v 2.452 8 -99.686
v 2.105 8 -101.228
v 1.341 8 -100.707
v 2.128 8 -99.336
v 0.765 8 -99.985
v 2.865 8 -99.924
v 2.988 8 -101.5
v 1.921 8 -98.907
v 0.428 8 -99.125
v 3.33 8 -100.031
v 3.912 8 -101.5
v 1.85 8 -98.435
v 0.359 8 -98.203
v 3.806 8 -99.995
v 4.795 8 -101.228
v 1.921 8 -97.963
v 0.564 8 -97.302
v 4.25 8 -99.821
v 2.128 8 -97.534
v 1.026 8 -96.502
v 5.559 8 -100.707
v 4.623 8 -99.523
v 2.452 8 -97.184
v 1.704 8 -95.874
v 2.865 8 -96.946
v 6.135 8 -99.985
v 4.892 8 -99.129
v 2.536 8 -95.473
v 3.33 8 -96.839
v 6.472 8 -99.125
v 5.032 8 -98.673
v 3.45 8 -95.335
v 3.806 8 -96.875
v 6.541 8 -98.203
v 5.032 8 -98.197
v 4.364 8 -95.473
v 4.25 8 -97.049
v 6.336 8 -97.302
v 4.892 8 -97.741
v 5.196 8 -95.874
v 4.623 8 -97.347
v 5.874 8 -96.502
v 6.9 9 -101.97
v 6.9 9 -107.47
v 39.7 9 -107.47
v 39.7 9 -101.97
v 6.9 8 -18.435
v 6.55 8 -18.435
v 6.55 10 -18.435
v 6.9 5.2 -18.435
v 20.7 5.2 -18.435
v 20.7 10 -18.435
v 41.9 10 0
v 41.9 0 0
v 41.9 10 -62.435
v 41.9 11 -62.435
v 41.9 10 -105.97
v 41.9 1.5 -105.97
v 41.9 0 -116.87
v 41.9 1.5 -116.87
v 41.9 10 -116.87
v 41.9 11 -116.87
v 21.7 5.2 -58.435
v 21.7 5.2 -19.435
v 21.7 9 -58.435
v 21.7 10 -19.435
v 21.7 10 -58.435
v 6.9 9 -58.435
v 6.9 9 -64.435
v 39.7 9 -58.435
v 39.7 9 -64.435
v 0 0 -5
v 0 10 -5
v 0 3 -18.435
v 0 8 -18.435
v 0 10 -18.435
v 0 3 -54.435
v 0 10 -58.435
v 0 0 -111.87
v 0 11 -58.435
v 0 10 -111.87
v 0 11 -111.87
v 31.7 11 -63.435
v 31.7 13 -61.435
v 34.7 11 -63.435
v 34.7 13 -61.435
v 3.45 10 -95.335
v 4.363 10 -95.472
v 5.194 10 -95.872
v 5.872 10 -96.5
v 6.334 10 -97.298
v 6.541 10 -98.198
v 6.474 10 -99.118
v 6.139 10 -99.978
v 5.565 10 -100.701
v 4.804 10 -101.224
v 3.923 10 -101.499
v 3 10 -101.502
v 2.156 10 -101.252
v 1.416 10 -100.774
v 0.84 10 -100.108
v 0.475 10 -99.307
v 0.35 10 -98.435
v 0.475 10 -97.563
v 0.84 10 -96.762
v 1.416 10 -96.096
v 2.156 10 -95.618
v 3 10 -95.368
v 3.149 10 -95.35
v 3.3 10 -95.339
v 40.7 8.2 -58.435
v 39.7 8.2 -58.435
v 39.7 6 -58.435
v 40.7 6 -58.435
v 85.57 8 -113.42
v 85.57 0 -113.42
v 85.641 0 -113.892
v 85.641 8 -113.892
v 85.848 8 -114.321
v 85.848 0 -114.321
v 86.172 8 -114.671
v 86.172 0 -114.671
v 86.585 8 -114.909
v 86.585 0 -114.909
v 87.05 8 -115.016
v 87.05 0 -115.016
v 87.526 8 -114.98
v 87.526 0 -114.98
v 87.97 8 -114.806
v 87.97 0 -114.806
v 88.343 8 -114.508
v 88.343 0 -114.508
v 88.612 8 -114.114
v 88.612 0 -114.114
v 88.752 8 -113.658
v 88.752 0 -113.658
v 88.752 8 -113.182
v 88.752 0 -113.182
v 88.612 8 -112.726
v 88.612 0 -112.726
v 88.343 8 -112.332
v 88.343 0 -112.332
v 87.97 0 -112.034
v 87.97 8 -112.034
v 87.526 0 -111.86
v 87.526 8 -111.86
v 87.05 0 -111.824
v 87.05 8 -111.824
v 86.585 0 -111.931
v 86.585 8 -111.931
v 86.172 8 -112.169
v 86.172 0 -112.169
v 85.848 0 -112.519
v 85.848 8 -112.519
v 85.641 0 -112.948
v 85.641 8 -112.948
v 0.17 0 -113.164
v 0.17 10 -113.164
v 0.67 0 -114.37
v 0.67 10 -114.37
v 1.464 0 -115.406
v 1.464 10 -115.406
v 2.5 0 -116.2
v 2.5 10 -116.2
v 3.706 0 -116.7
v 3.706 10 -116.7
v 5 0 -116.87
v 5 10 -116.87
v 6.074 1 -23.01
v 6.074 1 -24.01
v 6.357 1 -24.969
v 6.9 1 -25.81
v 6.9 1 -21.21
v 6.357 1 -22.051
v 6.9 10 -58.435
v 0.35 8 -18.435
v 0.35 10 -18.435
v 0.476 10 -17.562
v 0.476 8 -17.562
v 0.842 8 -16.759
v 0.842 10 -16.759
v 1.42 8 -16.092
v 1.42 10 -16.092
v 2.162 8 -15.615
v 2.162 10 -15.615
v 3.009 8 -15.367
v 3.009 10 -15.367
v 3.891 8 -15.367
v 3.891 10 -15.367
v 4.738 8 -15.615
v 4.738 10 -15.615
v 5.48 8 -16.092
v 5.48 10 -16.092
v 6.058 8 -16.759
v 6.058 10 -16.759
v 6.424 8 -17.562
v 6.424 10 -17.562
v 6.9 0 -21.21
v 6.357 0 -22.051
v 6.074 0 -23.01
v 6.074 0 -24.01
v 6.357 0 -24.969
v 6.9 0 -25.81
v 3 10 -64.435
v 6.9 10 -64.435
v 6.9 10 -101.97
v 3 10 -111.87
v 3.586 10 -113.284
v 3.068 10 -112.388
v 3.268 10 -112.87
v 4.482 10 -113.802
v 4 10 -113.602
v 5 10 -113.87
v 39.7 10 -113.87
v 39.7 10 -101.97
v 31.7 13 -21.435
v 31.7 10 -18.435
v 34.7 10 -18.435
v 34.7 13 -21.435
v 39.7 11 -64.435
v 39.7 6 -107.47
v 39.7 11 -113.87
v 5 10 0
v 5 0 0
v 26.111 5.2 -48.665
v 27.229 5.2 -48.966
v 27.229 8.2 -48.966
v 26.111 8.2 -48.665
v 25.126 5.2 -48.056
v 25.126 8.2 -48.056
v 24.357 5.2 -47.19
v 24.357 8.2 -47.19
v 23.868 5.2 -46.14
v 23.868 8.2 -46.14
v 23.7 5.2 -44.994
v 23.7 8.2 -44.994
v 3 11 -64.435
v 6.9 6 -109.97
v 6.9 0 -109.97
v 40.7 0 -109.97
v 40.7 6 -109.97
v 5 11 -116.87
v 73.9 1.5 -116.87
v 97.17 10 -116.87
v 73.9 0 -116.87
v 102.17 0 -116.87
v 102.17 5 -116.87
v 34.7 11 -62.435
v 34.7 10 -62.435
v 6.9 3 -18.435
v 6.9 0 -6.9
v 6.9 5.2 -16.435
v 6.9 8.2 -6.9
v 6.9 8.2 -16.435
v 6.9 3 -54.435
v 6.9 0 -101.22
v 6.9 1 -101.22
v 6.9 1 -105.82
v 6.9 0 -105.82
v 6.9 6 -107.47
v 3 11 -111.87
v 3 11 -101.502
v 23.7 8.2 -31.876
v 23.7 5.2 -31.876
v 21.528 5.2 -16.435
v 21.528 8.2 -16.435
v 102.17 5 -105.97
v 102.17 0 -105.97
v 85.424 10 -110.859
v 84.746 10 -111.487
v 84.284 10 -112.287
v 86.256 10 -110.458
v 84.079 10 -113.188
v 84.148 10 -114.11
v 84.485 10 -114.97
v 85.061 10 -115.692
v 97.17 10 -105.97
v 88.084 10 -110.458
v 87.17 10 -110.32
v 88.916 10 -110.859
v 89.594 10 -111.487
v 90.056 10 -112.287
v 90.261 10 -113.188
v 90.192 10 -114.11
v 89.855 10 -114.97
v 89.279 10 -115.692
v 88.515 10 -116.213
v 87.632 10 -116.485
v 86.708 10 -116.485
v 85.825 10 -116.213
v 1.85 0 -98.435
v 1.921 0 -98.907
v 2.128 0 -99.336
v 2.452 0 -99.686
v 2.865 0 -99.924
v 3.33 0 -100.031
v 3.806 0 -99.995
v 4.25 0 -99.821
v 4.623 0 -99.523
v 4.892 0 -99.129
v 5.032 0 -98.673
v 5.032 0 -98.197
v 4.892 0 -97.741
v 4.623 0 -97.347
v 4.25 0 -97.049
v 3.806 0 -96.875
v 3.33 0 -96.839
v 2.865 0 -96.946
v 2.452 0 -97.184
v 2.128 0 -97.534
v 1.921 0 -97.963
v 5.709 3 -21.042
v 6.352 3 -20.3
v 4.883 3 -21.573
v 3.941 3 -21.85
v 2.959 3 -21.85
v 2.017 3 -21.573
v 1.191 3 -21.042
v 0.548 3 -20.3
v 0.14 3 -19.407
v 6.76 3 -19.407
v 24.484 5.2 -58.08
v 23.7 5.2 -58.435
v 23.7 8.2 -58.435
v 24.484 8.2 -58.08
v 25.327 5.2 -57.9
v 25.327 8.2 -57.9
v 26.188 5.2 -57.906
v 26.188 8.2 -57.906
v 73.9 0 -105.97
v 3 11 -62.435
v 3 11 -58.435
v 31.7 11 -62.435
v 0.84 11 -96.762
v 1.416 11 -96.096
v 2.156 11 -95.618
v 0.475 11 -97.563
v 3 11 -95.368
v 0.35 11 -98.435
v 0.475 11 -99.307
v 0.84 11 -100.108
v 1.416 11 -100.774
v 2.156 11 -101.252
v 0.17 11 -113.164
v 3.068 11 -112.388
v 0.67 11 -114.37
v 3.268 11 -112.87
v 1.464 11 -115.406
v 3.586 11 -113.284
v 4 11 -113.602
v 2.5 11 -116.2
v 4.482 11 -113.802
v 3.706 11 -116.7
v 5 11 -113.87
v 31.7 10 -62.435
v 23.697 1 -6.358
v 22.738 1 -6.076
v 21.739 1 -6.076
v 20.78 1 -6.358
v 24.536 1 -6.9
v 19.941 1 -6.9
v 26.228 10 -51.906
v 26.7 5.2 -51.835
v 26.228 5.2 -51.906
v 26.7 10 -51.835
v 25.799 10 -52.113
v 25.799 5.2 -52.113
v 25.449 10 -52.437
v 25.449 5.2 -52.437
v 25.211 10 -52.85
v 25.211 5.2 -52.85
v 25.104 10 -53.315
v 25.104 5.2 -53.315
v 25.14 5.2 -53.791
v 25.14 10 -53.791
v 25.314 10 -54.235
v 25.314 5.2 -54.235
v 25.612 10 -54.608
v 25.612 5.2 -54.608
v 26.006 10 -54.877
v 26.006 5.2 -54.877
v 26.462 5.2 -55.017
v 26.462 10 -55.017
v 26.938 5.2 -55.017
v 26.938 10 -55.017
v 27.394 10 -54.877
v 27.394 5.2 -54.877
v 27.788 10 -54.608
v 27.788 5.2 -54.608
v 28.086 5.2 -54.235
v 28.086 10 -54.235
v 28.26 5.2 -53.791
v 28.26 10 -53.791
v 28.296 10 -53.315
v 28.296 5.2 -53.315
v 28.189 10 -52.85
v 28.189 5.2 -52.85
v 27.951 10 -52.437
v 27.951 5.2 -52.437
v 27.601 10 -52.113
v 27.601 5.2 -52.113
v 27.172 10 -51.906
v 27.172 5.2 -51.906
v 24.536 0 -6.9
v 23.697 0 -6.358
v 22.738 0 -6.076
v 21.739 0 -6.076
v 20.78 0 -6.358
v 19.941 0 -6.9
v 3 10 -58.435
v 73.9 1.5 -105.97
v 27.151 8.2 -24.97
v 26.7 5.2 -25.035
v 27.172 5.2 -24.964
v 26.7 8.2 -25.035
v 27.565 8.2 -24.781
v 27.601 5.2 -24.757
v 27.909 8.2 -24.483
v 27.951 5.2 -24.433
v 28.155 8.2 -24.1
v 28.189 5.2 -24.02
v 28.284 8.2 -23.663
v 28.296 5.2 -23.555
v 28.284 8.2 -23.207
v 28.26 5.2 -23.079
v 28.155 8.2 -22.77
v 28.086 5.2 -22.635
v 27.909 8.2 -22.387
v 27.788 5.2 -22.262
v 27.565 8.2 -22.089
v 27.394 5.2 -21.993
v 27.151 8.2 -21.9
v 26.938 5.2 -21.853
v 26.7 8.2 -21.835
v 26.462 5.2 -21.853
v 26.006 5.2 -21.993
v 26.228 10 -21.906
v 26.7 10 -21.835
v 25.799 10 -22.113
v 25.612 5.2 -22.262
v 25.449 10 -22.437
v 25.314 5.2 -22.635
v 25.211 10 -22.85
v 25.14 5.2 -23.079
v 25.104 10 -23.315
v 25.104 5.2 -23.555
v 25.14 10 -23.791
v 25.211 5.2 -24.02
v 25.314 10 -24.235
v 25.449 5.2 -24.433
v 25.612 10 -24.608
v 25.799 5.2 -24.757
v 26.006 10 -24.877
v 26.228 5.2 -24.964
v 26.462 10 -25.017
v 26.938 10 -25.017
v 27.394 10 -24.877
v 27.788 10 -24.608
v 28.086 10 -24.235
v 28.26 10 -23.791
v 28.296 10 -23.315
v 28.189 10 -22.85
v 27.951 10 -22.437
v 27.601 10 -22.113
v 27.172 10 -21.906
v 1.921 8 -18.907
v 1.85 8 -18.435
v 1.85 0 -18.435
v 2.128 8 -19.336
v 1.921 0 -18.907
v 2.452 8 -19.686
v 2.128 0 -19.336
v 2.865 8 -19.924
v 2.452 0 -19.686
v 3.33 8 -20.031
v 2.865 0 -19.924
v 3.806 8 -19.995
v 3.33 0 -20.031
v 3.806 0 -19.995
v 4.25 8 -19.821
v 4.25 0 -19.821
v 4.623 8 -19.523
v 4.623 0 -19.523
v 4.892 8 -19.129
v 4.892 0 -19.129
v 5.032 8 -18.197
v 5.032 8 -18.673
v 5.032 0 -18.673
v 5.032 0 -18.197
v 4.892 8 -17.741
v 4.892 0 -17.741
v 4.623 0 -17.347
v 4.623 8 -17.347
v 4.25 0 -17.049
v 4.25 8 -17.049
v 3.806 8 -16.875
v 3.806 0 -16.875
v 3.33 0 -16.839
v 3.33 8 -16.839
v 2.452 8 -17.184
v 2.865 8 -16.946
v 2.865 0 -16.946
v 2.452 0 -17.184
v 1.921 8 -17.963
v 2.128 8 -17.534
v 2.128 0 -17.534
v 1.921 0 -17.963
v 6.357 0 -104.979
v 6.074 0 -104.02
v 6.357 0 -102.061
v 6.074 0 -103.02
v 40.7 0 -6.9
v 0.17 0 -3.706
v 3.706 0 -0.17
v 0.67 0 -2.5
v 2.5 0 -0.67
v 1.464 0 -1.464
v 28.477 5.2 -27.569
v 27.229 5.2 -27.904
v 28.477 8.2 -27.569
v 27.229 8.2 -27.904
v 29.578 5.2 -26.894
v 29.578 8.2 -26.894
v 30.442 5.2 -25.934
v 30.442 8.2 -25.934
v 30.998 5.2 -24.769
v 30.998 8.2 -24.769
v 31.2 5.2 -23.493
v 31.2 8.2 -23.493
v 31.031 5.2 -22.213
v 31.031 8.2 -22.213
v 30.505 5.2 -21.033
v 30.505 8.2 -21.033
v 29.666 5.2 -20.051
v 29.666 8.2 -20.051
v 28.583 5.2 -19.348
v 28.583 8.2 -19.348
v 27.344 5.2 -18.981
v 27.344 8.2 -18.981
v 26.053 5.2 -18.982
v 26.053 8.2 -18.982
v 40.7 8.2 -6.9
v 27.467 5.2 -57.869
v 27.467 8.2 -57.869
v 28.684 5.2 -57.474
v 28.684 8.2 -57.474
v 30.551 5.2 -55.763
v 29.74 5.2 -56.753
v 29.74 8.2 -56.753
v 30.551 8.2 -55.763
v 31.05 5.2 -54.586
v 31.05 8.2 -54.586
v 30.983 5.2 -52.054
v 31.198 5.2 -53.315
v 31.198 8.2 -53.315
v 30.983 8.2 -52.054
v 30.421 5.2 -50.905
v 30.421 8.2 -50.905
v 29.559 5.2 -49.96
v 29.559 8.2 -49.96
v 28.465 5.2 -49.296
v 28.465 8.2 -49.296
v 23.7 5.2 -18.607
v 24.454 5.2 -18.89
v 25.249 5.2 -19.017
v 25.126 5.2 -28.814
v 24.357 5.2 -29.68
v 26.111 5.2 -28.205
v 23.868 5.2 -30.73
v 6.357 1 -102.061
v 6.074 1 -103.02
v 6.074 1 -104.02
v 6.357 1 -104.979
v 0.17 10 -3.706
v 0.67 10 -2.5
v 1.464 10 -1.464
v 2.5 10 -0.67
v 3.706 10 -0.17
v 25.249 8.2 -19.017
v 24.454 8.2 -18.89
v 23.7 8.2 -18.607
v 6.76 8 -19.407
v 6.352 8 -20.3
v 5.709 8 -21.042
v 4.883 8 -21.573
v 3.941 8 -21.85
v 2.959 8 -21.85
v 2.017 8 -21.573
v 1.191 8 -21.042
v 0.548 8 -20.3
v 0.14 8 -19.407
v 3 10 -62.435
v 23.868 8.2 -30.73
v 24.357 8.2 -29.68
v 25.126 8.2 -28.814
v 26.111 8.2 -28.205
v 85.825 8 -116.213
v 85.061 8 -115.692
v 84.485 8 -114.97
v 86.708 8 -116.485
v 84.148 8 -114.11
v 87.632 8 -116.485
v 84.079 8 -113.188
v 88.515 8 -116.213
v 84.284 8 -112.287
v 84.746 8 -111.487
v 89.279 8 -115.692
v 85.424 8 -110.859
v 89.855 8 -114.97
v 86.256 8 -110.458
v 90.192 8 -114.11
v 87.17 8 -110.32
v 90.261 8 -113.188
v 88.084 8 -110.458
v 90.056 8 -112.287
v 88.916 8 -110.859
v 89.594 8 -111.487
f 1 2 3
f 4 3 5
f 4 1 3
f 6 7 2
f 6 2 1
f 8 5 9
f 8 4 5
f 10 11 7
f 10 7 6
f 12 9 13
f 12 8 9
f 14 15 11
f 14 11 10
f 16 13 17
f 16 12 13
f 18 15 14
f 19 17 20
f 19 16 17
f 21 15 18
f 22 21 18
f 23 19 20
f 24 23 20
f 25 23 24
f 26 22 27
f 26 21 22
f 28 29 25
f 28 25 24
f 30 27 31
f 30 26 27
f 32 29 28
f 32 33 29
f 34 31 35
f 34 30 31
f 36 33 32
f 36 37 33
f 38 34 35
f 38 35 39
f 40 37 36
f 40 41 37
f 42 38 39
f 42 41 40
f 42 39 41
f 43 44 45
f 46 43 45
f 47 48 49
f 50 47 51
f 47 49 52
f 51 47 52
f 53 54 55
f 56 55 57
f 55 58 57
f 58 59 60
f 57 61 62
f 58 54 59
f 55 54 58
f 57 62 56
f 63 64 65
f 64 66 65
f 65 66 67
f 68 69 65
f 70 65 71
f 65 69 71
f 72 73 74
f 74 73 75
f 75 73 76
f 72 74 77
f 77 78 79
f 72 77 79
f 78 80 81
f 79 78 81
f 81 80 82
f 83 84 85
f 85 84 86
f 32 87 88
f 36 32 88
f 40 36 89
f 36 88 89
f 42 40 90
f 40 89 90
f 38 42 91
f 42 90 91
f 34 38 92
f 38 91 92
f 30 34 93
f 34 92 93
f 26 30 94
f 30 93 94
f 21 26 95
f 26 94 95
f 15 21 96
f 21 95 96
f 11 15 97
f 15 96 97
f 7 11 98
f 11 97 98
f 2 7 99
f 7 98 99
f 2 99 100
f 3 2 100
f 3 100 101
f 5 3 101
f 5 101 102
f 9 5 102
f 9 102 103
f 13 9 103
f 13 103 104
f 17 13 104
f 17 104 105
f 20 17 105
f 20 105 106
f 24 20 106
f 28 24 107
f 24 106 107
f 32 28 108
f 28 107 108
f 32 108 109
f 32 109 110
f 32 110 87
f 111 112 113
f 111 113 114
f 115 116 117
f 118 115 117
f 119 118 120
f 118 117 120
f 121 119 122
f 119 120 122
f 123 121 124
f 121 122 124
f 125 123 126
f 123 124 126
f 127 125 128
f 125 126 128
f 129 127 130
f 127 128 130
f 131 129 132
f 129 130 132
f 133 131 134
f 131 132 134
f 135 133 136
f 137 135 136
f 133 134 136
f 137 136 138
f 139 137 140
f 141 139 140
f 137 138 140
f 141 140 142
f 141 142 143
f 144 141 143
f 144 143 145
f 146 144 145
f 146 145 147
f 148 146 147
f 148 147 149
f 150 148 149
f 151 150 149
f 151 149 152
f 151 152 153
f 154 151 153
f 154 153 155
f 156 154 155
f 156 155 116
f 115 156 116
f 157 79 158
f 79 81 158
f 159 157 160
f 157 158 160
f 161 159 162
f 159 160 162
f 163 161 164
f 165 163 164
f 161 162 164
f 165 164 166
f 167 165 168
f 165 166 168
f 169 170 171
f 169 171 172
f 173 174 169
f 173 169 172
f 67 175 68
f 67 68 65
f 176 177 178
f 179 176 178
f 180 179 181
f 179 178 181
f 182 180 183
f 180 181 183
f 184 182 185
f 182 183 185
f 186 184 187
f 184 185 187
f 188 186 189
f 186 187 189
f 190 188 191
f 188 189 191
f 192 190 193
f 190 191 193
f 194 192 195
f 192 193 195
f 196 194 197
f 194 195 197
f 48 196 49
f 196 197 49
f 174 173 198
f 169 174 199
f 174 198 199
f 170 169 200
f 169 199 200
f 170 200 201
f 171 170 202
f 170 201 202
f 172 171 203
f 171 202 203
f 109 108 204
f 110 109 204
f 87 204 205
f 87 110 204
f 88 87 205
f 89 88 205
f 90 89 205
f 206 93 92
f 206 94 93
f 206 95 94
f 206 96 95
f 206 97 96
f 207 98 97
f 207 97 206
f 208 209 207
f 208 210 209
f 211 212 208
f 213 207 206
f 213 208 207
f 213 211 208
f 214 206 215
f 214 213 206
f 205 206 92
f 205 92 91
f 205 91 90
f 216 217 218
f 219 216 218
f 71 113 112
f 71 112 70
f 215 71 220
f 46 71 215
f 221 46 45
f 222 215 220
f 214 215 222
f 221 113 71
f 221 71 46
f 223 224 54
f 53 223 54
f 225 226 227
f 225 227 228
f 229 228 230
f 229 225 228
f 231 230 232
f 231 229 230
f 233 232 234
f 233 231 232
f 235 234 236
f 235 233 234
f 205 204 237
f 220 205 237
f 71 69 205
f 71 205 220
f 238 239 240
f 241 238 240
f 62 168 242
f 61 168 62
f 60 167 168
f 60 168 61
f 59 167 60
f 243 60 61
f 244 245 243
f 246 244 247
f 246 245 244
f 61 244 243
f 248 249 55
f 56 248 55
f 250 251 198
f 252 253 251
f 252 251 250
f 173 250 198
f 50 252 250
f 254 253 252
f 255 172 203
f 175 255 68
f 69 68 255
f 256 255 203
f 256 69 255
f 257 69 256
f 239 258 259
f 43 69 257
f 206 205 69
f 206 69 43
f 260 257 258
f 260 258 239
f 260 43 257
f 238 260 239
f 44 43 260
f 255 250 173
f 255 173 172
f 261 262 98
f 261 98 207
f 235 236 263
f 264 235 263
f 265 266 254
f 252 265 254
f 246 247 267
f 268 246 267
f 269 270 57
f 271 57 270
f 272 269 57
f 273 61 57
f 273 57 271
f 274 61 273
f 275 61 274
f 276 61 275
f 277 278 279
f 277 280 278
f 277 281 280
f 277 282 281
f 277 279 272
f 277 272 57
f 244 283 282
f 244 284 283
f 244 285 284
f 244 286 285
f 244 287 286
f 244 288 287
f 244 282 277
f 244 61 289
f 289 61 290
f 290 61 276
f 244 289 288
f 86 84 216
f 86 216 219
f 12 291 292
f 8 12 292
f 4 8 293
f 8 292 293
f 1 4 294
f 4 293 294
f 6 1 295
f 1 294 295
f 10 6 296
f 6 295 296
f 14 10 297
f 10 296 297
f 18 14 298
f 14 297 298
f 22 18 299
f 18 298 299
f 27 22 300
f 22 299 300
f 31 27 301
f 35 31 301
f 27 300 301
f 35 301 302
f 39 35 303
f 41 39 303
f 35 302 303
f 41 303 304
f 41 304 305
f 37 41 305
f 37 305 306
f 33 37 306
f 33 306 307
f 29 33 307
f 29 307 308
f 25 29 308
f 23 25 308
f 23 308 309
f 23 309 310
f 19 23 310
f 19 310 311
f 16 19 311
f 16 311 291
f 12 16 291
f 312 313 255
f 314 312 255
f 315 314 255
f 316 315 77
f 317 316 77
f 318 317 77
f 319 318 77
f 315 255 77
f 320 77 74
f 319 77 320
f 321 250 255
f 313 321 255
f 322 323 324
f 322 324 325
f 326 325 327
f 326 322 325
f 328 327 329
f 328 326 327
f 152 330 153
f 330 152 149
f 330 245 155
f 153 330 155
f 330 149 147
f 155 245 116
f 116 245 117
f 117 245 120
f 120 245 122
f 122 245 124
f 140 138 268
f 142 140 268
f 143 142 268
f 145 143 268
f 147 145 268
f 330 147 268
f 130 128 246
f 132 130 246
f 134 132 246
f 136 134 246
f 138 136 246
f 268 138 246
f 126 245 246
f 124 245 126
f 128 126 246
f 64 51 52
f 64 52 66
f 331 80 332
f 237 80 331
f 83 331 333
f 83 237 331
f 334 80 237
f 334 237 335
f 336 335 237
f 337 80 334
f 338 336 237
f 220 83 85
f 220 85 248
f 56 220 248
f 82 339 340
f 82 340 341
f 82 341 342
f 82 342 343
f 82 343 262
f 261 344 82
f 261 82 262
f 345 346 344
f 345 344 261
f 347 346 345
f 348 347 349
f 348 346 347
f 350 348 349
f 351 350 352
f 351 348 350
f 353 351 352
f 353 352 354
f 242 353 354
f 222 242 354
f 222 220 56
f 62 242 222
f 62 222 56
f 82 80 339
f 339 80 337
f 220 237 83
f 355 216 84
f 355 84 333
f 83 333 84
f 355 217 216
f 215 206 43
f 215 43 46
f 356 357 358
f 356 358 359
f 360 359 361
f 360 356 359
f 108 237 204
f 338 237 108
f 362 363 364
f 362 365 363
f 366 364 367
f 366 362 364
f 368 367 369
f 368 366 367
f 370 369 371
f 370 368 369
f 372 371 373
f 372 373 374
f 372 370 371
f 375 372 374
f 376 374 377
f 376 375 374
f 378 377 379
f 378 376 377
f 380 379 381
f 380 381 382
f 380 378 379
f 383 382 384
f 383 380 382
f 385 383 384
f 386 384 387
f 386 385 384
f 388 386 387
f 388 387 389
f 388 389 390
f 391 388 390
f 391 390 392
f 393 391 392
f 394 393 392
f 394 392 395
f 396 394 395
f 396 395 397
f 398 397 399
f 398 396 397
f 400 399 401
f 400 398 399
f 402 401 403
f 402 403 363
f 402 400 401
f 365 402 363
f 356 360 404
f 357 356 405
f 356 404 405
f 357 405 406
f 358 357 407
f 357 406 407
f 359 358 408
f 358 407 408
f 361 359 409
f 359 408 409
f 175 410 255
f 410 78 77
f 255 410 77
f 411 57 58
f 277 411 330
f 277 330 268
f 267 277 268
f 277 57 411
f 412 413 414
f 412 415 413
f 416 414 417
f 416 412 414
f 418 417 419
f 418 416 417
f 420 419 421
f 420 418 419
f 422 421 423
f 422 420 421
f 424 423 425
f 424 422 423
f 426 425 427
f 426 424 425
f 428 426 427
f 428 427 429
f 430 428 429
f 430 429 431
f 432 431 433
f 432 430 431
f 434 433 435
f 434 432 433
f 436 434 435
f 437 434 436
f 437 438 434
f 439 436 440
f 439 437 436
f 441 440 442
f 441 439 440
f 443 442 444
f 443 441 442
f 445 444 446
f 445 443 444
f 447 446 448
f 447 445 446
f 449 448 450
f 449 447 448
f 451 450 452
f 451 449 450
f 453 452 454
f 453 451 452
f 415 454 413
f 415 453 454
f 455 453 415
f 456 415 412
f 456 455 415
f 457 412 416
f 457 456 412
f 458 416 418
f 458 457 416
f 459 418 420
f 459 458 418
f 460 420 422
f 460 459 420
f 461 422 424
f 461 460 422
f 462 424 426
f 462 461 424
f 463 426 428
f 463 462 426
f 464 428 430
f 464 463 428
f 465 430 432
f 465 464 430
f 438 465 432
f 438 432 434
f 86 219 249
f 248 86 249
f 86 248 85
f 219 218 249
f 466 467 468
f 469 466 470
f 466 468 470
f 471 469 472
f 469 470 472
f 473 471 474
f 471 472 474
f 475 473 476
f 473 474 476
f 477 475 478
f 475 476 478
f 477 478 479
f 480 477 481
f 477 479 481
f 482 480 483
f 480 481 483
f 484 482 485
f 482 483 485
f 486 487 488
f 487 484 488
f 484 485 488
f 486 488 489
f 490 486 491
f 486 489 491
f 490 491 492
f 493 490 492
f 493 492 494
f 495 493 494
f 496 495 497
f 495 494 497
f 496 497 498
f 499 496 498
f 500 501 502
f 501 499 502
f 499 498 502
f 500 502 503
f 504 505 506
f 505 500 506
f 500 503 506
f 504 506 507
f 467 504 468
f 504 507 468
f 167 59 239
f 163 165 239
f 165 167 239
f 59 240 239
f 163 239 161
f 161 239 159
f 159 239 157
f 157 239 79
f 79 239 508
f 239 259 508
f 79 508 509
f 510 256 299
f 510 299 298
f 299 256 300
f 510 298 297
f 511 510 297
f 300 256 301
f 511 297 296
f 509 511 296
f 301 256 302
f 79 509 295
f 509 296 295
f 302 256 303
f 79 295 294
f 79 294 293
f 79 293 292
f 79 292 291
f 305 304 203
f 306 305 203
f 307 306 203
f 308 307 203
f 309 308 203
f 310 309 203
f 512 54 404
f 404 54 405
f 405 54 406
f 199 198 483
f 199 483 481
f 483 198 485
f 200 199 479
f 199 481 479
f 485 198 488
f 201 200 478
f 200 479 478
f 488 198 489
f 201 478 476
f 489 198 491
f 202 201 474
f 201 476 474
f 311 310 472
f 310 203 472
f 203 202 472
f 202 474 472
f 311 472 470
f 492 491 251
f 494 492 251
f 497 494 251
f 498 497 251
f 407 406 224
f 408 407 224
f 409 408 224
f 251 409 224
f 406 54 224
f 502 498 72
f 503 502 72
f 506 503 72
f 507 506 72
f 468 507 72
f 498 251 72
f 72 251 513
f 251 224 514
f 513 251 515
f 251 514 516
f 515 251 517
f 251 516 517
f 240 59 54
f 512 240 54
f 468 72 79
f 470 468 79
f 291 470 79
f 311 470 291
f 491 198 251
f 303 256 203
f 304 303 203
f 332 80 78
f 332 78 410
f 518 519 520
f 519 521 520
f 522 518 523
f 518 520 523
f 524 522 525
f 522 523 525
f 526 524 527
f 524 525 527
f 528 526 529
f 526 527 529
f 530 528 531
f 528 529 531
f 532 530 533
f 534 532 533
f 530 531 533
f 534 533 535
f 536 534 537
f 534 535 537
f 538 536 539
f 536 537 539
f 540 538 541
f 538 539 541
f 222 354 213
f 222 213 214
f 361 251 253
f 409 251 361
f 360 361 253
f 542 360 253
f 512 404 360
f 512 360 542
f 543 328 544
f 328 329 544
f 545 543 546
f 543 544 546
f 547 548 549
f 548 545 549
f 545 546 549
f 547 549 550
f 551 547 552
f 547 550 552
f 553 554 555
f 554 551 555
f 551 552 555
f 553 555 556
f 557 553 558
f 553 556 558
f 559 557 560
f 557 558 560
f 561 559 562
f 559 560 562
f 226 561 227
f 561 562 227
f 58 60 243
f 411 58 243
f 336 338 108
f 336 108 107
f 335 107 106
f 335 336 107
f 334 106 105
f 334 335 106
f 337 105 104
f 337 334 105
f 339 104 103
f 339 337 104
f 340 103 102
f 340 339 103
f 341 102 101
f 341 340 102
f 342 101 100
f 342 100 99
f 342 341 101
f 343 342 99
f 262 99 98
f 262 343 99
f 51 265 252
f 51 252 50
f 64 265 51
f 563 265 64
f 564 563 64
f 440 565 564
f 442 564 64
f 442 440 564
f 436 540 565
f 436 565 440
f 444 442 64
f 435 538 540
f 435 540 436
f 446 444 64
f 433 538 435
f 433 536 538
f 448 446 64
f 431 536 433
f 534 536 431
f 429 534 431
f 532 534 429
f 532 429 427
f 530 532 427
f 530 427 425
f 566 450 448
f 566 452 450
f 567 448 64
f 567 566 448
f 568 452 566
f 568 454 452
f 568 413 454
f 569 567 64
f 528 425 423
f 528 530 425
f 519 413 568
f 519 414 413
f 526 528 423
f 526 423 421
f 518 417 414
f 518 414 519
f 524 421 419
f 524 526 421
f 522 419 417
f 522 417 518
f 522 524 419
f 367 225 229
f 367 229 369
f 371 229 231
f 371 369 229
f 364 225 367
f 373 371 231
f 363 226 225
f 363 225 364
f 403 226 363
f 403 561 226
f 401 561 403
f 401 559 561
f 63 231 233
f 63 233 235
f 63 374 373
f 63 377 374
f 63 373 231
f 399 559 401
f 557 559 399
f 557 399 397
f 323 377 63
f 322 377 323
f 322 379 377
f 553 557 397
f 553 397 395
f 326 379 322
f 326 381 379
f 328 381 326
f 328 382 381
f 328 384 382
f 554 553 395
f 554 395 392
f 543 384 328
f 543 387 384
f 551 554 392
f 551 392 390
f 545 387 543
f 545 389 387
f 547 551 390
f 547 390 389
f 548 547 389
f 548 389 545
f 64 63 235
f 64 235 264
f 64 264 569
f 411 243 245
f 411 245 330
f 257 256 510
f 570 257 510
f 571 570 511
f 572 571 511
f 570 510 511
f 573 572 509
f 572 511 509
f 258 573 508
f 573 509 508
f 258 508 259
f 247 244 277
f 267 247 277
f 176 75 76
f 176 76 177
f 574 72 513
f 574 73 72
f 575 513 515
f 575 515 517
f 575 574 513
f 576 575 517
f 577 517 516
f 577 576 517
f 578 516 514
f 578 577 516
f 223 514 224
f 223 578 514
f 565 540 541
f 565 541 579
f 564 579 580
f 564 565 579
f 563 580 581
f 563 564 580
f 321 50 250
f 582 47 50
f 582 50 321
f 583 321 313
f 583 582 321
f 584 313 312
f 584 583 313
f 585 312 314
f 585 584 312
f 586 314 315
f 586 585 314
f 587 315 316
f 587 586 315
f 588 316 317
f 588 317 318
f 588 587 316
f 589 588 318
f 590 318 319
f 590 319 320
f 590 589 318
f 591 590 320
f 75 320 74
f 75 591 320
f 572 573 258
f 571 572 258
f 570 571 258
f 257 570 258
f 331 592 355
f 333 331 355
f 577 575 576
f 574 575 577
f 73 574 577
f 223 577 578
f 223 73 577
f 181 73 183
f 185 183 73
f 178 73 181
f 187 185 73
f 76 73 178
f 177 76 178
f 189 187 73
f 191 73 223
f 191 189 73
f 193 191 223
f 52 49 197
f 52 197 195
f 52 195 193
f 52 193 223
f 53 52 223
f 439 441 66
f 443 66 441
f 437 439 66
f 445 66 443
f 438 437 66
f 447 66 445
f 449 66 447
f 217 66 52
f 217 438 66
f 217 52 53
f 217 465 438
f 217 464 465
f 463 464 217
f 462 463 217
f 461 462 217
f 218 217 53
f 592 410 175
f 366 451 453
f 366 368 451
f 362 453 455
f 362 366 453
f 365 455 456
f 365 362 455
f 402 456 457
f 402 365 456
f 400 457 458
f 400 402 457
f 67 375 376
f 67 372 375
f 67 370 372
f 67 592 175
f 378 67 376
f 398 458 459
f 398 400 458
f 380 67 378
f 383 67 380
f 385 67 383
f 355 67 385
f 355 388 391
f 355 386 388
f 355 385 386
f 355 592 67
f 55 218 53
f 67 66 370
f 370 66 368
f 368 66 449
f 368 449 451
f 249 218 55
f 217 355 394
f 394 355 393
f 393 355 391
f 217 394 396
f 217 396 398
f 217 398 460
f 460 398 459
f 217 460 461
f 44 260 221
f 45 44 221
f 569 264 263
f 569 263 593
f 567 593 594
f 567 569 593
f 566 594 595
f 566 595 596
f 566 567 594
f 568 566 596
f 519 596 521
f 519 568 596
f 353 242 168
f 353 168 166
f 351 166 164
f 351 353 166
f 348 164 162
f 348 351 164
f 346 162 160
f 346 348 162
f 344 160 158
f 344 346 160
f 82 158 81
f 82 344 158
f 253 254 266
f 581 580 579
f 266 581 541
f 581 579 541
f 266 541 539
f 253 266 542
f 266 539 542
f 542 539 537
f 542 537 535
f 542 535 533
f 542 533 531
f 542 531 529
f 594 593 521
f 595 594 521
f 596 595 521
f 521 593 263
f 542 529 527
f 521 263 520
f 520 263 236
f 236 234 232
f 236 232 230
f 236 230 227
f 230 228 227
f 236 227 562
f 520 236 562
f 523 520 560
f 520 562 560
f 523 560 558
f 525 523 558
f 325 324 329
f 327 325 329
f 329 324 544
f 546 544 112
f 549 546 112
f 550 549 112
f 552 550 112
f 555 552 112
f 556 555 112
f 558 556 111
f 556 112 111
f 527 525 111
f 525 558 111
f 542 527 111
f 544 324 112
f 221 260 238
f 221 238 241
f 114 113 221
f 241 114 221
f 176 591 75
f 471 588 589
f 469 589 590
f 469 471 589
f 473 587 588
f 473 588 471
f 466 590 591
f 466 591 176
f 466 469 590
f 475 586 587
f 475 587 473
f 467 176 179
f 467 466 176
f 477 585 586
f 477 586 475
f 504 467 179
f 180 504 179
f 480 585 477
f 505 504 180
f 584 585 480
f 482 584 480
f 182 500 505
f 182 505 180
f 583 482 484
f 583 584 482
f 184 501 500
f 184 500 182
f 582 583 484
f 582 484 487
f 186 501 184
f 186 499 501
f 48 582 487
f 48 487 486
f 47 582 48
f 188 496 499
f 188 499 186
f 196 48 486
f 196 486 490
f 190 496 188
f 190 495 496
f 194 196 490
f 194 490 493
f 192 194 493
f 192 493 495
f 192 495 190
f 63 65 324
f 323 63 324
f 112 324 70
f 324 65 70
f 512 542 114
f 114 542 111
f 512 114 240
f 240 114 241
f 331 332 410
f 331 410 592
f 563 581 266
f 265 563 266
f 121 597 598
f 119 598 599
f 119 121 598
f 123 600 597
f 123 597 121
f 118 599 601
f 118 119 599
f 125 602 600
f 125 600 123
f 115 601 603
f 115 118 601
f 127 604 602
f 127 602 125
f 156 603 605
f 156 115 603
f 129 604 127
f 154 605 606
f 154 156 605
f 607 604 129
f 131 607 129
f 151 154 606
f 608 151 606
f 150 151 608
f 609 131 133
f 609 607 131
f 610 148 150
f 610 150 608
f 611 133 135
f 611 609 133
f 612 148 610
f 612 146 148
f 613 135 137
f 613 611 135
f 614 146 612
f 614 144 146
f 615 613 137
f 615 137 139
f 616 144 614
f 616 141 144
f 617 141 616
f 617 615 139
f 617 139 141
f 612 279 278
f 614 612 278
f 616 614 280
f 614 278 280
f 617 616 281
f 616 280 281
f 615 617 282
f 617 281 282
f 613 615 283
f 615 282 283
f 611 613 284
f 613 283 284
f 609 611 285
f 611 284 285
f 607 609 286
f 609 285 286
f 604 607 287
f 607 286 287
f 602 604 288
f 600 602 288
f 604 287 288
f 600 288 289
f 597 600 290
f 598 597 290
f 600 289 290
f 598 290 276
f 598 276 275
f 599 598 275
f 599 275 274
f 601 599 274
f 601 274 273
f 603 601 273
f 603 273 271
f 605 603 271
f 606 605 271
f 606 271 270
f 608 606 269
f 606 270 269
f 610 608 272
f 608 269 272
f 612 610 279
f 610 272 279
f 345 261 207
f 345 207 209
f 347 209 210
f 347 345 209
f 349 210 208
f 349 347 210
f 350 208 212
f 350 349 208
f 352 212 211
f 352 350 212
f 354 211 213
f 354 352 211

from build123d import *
from build123d.topology import SkipClean

# Parameters (mm, degrees)
SKETCH_1_W              = 337.35
SKETCH_1_H              = 116.87
SKETCH_1_W_2            = 324.05
SKETCH_1_H_2            = 103.07
EXTRUDE_1_DEPTH         = 10
FILLET_1_R              = 5
HOLE_WIZARD_3_2_3_2_1_D = 3.2
SKETCH_5_W              = 32
SKETCH_5_H              = 1.5
CUT_EXTRUDE_1_DEPTH     = 355.962566195
EXTRUDE_2_REACH         = 356.963
SKETCH_6_W              = 3
SKETCH_6_H              = 10
SKETCH_7_W              = 257.05
SKETCH_7_H              = 10
EXTRUDE_3_DEPTH         = 4
SKETCH_8_W              = 257.05
SKETCH_8_H              = 4
EXTRUDE_4_DEPTH         = 3
SKETCH_11_W             = 99.07
SKETCH_11_H             = 13
EXTRUDE_5_DEPTH         = 2
SKETCH_13_W             = 42
SKETCH_13_H             = 6.5
CUT_EXTRUDE_2_DEPTH     = 354.743782136
SKETCH_14_W             = 121.5
SKETCH_14_H             = 3.5
CUT_EXTRUDE_3_DEPTH     = 355.962566195
SKETCH_16_W             = 32
SKETCH_16_H             = 8.5
EXTRUDE_7_DEPTH         = 4
SKETCH_17_W             = 103.07
SKETCH_17_H             = 3
CUT_EXTRUDE_4_DEPTH     = 0.1
EXTRUDE_8_DEPTH         = 2
SKETCH_19_W             = 70.55
SKETCH_19_H             = 2
SKETCH_19_W_2           = 95
EXTRUDE_9_DEPTH         = 3
SKETCH_20_R             = 3.5
CUT_EXTRUDE_5_DEPTH     = 4
SKETCH_21_R             = 3.1
CUT_EXTRUDE_6_DEPTH     = 2
SKETCH_24_W             = 103.07
SKETCH_24_H             = 3
CUT_EXTRUDE_8_DEPTH     = 358.160495296
SKETCH_26_W             = 675.8738904
SKETCH_26_H             = 351.874844901
CUT_EXTRUDE_9_DEPTH     = 358.160495296
SKETCH_27_W             = 1.8
SKETCH_27_H             = 103.07
CUT_EXTRUDE_10_DEPTH    = 156.554832133
CUT_EXTRUDE_11_DEPTH    = 7
SKETCH_30_W             = 6.9
SKETCH_30_H             = 3.45
CUT_EXTRUDE_12_DEPTH    = 2
SKETCH_31_W             = 19
SKETCH_31_H             = 51.535
EXTRUDE_10_DEPTH        = 1.8
CHAMFER_2_SIZE          = 1
SKETCH_32_W             = 14.8
SKETCH_32_H             = 11.535
EXTRUDE_11_DEPTH        = 1.8
CHAMFER_1_SIZE          = 5
CHAMFER_3_SIZE          = 1
EXTRUDE_12_DEPTH        = 6.9
EXTRUDE_13_DEPTH        = 3
EXTRUDE_START           = 1
EXTRUDE_14_DEPTH        = 1
SKETCH_36_W             = 1
SKETCH_36_H             = 51.535
EXTRUDE_15_DEPTH        = 4
SKETCH_37_W             = 33.661543988
SKETCH_37_H             = 2.5
EXTRUDE_16_DEPTH        = 4
SKETCH_38_W             = 36.7
SKETCH_38_H             = 6
EXTRUDE_18_DEPTH        = 1
SKETCH_39_W             = 32.8
SKETCH_39_H             = 5.5
EXTRUDE_19_DEPTH        = 1
SKETCH_40_R             = 1.6
CUT_EXTRUDE_13_DEPTH    = 156.554832133
SKETCH_41_R             = 4.5
SKETCH_41_R_2           = 1.6
EXTRUDE_20_DEPTH        = 3
FILLET_2_R              = 4
SKETCH_42_W             = 3
SKETCH_42_H             = 46
EXTRUDE_21_DEPTH        = 3
CHAMFER_4_SIZE          = 3
SKETCH_43_W             = 2.2
SKETCH_43_H             = 52.435
EXTRUDE_22_DEPTH        = 1
SKETCH_44_W             = 38.9
SKETCH_44_H             = 2
EXTRUDE_23_DEPTH        = 1


# Some blends are built 0.0001 mm under size
with BuildPart() as part:
    # 草图1 → 凸台-拉伸1 (new body)
    with BuildSketch(Plane(origin=(0, 0, 0), x_dir=(1, 0, 0), z_dir=(0, 1, 0))):
        with Locations((168.675, 58.435)):
            Rectangle(SKETCH_1_W, SKETCH_1_H)
        with Locations((168.925, 58.435)):
            Rectangle(SKETCH_1_W_2, SKETCH_1_H_2, mode=Mode.SUBTRACT)
    extrude(amount=EXTRUDE_1_DEPTH)

    # 圆角1
    fillet_1_edges = [part.edges().sort_by_distance(p)[0] for p in [
        (0, 5, -116.87),
        (337.35, 5, -116.87),
        (337.35, 5, 0),
        (0, 5, 0),
    ]]
    fillet(fillet_1_edges, radius=FILLET_1_R)

    # Ø3.2 (3.2) 直径孔1 (through all)
    with Locations(Plane(origin=(0, 10, 0), x_dir=(1, 0, 0), z_dir=(0, 1, 0))):
        with Locations((3.45, 98.435), (87.17, 113.42), (247.17, 113.42), (334.15, 98.435), (334.15, 18.435), (247.17, 3.45), (87.17, 3.45), (3.45, 18.435)):
            Hole(HOLE_WIZARD_3_2_3_2_1_D / 2)

    # 草图5 → 切除-拉伸1 (cut, through all)
    with BuildSketch(Plane.XY.offset(-109.97)):
        with Locations((57.9, 0.75)):
            Rectangle(SKETCH_5_W, SKETCH_5_H)
    extrude(amount=-CUT_EXTRUDE_1_DEPTH, mode=Mode.SUBTRACT)

    # 草图6 → 凸台-拉伸2 (add, up to next)
    with BuildSketch(Plane.XY.offset(-109.97), mode=Mode.PRIVATE) as extrude_2_sk1:
        with Locations((40.4, 5)):
            Rectangle(SKETCH_6_W, SKETCH_6_H)
    extrude_2_tool1 = extrude(extrude_2_sk1.sketch, amount=EXTRUDE_2_REACH, mode=Mode.PRIVATE) - part.part
    add(extrude_2_tool1.solids().sort_by_distance((40.4, 5, -109.97))[0])

    # 草图7 → 凸台-拉伸3 (add)
    with BuildSketch(Plane.XY.offset(-109.97)):
        with Locations((202.425, 5)):
            Rectangle(SKETCH_7_W, SKETCH_7_H)
    extrude(amount=EXTRUDE_3_DEPTH)

    # 草图8 → 凸台-拉伸4 (add)
    with BuildSketch(Plane.XZ):
        with Locations((202.425, -107.97)):
            Rectangle(SKETCH_8_W, SKETCH_8_H)
    extrude(amount=EXTRUDE_4_DEPTH)

    # 草图11 → 凸台-拉伸5 (add)
    with BuildSketch(Plane.ZY.offset(-330.95)):
        with Locations((-56.435, 3.5)):
            Rectangle(SKETCH_11_W, SKETCH_11_H)
    extrude(amount=EXTRUDE_5_DEPTH)

    # 草图13 → 切除-拉伸2 (cut, through all)
    with BuildSketch(Plane.XY.offset(-105.97)):
        with Locations((307.95, 0.25)):
            Rectangle(SKETCH_13_W, SKETCH_13_H)
    extrude(amount=-CUT_EXTRUDE_2_DEPTH, mode=Mode.SUBTRACT)

    # 草图14 → 切除-拉伸3 (cut, through all)
    with BuildSketch(Plane(origin=(0, 0, -6.9), x_dir=(-1, 0, 0), z_dir=(0, 0, -1))):
        with Locations((-173.2, 1.75)):
            Rectangle(SKETCH_14_W, SKETCH_14_H)
    extrude(amount=-CUT_EXTRUDE_3_DEPTH, mode=Mode.SUBTRACT)

    # 草图16 → 凸台-拉伸7 (add)
    with BuildSketch(Plane.XY.offset(-109.97)):
        with Locations((57.9, 5.75)):
            Rectangle(SKETCH_16_W, SKETCH_16_H)
    extrude(amount=EXTRUDE_7_DEPTH)

    # 草图17 → 切除-拉伸4 (cut)
    with BuildSketch(Plane(origin=(330.95, 0, 0), x_dir=(0, 0, -1), z_dir=(1, 0, 0))):
        with Locations((58.435, -1.5)):
            Rectangle(SKETCH_17_W, SKETCH_17_H)
    extrude(amount=-CUT_EXTRUDE_4_DEPTH, mode=Mode.SUBTRACT)

    # 草图18 → 凸台-拉伸8 (add)
    with BuildSketch(Plane(origin=(0, 0, -6.9), x_dir=(-1, 0, 0), z_dir=(0, 0, -1))):
        Polygon((-233.95, 0), (-233.95, 3.5), (-112.45, 3.5), (-112.45, 0), (-41.9, 0), (-41.9, 10), (-328.95, 10), (-328.95, 0), align=None)
    extrude(amount=EXTRUDE_8_DEPTH)

    # 草图19 → 凸台-拉伸9 (add)
    with BuildSketch(Plane.XZ):
        with Locations((77.175, -7.9)):
            Rectangle(SKETCH_19_W, SKETCH_19_H)
        with Locations((281.45, -7.9)):
            Rectangle(SKETCH_19_W_2, SKETCH_19_H)
    extrude(amount=EXTRUDE_9_DEPTH)

    # 草图20 → 切除-拉伸5 (cut)
    with BuildSketch(Plane.XZ.offset(3)):
        with Locations((92.088456012, -9.54)):
            Circle(SKETCH_20_R)
        with Locations((262.268456012, -9.54)):
            Circle(SKETCH_20_R)
        with Locations((328.308456012, -13.35)):
            Circle(SKETCH_20_R)
        with Locations((328.308456012, -74.31)):
            Circle(SKETCH_20_R)
        with Locations((137.808456012, -107.33)):
            Circle(SKETCH_20_R)
        with Locations((22.238456012, -9.54)):
            Circle(SKETCH_20_R)
        with Locations((9.538456012, -23.51)):
            Circle(SKETCH_20_R)
        with Locations((9.538456012, -103.52)):
            Circle(SKETCH_20_R)
    extrude(amount=-CUT_EXTRUDE_5_DEPTH, mode=Mode.SUBTRACT)

    # 草图21 → 切除-拉伸6 (cut)
    with BuildSketch(Plane(origin=(0, 10, 0), x_dir=(1, 0, 0), z_dir=(0, 1, 0))):
        with Locations(Location((87.17, 113.42, 0), (0, 0, 270))):
            Circle(SKETCH_21_R)
        with Locations(Location((247.17, 113.42, 0), (0, 0, 270))):
            Circle(SKETCH_21_R)
        with Locations(Location((334.15, 98.435, 0), (0, 0, 270))):
            Circle(SKETCH_21_R)
        with Locations(Location((334.15, 18.435, 0), (0, 0, 270))):
            Circle(SKETCH_21_R)
        with Locations(Location((247.17, 3.45, 0), (0, 0, 270))):
            Circle(SKETCH_21_R)
        with Locations(Location((87.17, 3.45, 0), (0, 0, 270))):
            Circle(SKETCH_21_R)
        with Locations(Location((3.45, 18.435, 0), (0, 0, 270))):
            Circle(SKETCH_21_R)
        with Locations(Location((3.45, 98.435, 0), (0, 0, 270))):
            Circle(SKETCH_21_R)
    extrude(amount=-CUT_EXTRUDE_6_DEPTH, mode=Mode.SUBTRACT)

    # 草图24 → 切除-拉伸8 (cut, through all)
    with BuildSketch(Plane(origin=(337.35, 0, 0), x_dir=(0, 0, -1), z_dir=(1, 0, 0))):
        with Locations((58.435, -1.5)):
            Rectangle(SKETCH_24_W, SKETCH_24_H)
    extrude(amount=-CUT_EXTRUDE_8_DEPTH, mode=Mode.SUBTRACT)

    # 草图26 → 切除-拉伸9 (cut, through all)
    with BuildSketch(Plane(origin=(0, 10, 0), x_dir=(1, 0, 0), z_dir=(0, 1, 0))):
        with Locations((186.884533427, 86.899688896)):
            Rectangle(SKETCH_26_W, SKETCH_26_H)
        Polygon((0, 116.87), (102.17, 116.87), (102.17, 8.9), (41.9, 8.9), (41.9, 0), (0, 0), align=None, mode=Mode.SUBTRACT)
    extrude(amount=-CUT_EXTRUDE_9_DEPTH, mode=Mode.SUBTRACT)

    # 草图27 → 切除-拉伸10 (cut, through all)
    with BuildSketch(Plane(origin=(0, 10, 0), x_dir=(1, 0, 0), z_dir=(0, 1, 0))):
        with Locations((39.8, 58.435)):
            Rectangle(SKETCH_27_W, SKETCH_27_H)
    extrude(amount=-CUT_EXTRUDE_10_DEPTH, mode=Mode.SUBTRACT)

    # 草图28 → 切除-拉伸11 (cut)
    with BuildSketch(Plane(origin=(0, 10, 0), x_dir=(1, 0, 0), z_dir=(0, 1, 0))):
        with BuildLine():
            Line((0, 58.435), (6.9, 58.435))
            Line((6.9, 58.435), (6.9, 18.435))
            ThreePointArc((6.9, 18.435), (3.45, 21.885), (0, 18.435))
            Line((0, 18.435), (0, 58.435))
        make_face()
    extrude(amount=-CUT_EXTRUDE_11_DEPTH, mode=Mode.SUBTRACT)

    # 草图30 → 切除-拉伸12 (cut)
    with BuildSketch(Plane(origin=(0, 8, 0), x_dir=(1, 0, 0), z_dir=(0, 1, 0))):
        with Locations((3.45, 20.16)):
            Rectangle(SKETCH_30_W, SKETCH_30_H)
    extrude(amount=CUT_EXTRUDE_12_DEPTH, mode=Mode.SUBTRACT)

    # 草图31 → 凸台-拉伸10 (add)
    with BuildSketch(Plane(origin=(0, 10, 0), x_dir=(1, 0, 0), z_dir=(0, 1, 0))):
        with Locations((31.2, 32.6675)):
            Rectangle(SKETCH_31_W, SKETCH_31_H)
    extrude(amount=-EXTRUDE_10_DEPTH)

    # 倒角2
    chamfer_2_edges = [part.edges().sort_by_distance(p)[0] for p in [
        (40.7, 9.1, -58.435),
    ]]
    chamfer(chamfer_2_edges, length=CHAMFER_2_SIZE)

    # 草图32 → 凸台-拉伸11 (add)
    with BuildSketch(Plane(origin=(0, 10, 0), x_dir=(1, 0, 0), z_dir=(0, 1, 0))):
        with Locations((14.3, 12.6675)):
            Rectangle(SKETCH_32_W, SKETCH_32_H)
    extrude(amount=-EXTRUDE_11_DEPTH)

    # 倒角1
    chamfer_1_edges = [part.edges().sort_by_distance(p)[0] for p in [
        (102.17, 10, -111.42),
    ]]
    chamfer(chamfer_1_edges, length=CHAMFER_1_SIZE)

    # 倒角3
    chamfer_3_edges = [part.edges().sort_by_distance(p)[0] for p in [
        (21.7, 9.1, -18.435),
    ]]
    chamfer(chamfer_3_edges, length=CHAMFER_3_SIZE)

    # 草图33 → 凸台-拉伸12 (add)
    with BuildSketch(Plane.ZY):
        Polygon((-58.435, 10), (-54.435, 3), (-58.435, 3), align=None)
    extrude(amount=-EXTRUDE_12_DEPTH)

    # 草图34 → 凸台-拉伸13 (add)
    with BuildSketch(Plane.XZ.offset(-8.2)):
        Polygon((21.528427125, -16.435), (6.9, -16.435), (6.9, -18.435), (20.7, -18.435), (21.7, -19.435), (21.7, -58.435), (23.7, -58.435), (23.7, -18.606572875), align=None)
    extrude(amount=EXTRUDE_13_DEPTH)

    # 草图35 → 凸台-拉伸14 (add)
    with SkipClean():  # the faces are left unmerged after this step: merging them gives an invalid solid
        with BuildSketch(Plane(origin=(0, 10, 0), x_dir=(1, 0, 0), z_dir=(0, 1, 0)).offset(EXTRUDE_START)):
            with BuildLine():
                ThreePointArc((5, 116.87), (1.464466094, 115.405533906), (0, 111.87))
                Line((0, 111.87), (0, 58.435))
                Line((0, 58.435), (3, 58.435))
                Line((3, 58.435), (3, 95.367835185))
                ThreePointArc((3, 95.367835185), (0.35, 98.435), (3, 101.502164815))
                Line((3, 101.502164815), (3, 111.87))
                ThreePointArc((3, 111.87), (3.585786438, 113.284213562), (5, 113.87))
                Line((5, 113.87), (41.9, 113.87))
                Line((41.9, 113.87), (41.9, 116.87))
                Line((41.9, 116.87), (5, 116.87))
            make_face()
        extrude(amount=-EXTRUDE_14_DEPTH)

    # 草图36 → 凸台-拉伸15 (add)
    with BuildSketch(Plane(origin=(0, 10, 0), x_dir=(1, 0, 0), z_dir=(0, 1, 0))):
        with Locations((40.2, 84.2025)):
            Rectangle(SKETCH_36_W, SKETCH_36_H)
    extrude(amount=-EXTRUDE_15_DEPTH)

    # 草图37 → 凸台-拉伸16 (add)
    with SkipClean():  # the faces are left unmerged after this step: merging them gives an invalid solid
        with BuildSketch(Plane.XZ.offset(-6)):
            with Locations((22.869228006, -108.72)):
                Rectangle(SKETCH_37_W, SKETCH_37_H)
        extrude(amount=-EXTRUDE_16_DEPTH)

    # 草图38 → 凸台-拉伸18 (add)
    with BuildSketch(Plane(origin=(0, 10, 0), x_dir=(1, 0, 0), z_dir=(0, 1, 0))):
        with Locations((21.35, 61.435)):
            Rectangle(SKETCH_38_W, SKETCH_38_H)
    extrude(amount=-EXTRUDE_18_DEPTH)

    # 草图39 → 凸台-拉伸19 (add)
    with SkipClean():  # the faces are left unmerged after this step: merging them gives an invalid solid
        with BuildSketch(Plane(origin=(0, 10, 0), x_dir=(1, 0, 0), z_dir=(0, 1, 0))):
            with Locations((23.3, 104.72)):
                Rectangle(SKETCH_39_W, SKETCH_39_H)
        extrude(amount=-EXTRUDE_19_DEPTH)

    # 草图40 → 切除-拉伸13 (cut, through all)
    with SkipClean():  # the faces are left unmerged after this step: merging them gives an invalid solid
        with BuildSketch(Plane(origin=(0, 10, 0), x_dir=(1, 0, 0), z_dir=(0, 1, 0))):
            with Locations(Location((26.7, 53.435, 0), (0, 0, 270))):
                Circle(SKETCH_40_R)
            with Locations(Location((26.7, 23.435, 0), (0, 0, 270))):
                Circle(SKETCH_40_R)
        extrude(amount=-CUT_EXTRUDE_13_DEPTH, mode=Mode.SUBTRACT)

    # 草图41 → 凸台-拉伸20 (add)
    # profile 1 of 2: a face of its own
    with SkipClean():  # the faces are left unmerged after this step: merging them gives an invalid solid
        with BuildSketch(Plane.XZ.offset(-8.2)):
            with Locations((26.7, -23.435)):
                Circle(SKETCH_41_R)
            with Locations(Location((26.7, -23.435, 0), (0, 0, 270))):
                Circle(SKETCH_41_R_2, mode=Mode.SUBTRACT)
        # profile 2 of 2: a face of its own
        with BuildSketch(Plane.XZ.offset(-8.2)):
            with Locations((26.7, -53.435)):
                Circle(SKETCH_41_R)
            with Locations(Location((26.7, -53.435, 0), (0, 0, 90))):
                Circle(SKETCH_41_R_2, mode=Mode.SUBTRACT)
        extrude(amount=EXTRUDE_20_DEPTH)

    # 圆角2
    # the kernel refuses this fillet: 4 mm, written as the material it adds along each edge
    with BuildSketch(Plane(origin=(23.7, 5.2, -56.789101966), x_dir=(0, 0, -1), z_dir=(0, 1, 0))) as fillet_2_piece_1:
        with BuildLine():
            CenterArc((5.090717348, -2.033032191), FILLET_2_R, 149.452131315, 37.080030589)
            Line((1.11668473, -2.488075866), (1.037204077, -2.497176739))
            ThreePointArc((1.037204077, -2.497176739), (0.678377965, -1.190164205), (-0.059628479, -0.053333333))
            Line((-0.059628479, -0.053333333), (0, 0.08))
            ThreePointArc((0, 0.08), (0.822949017, 0.08), (1.577001647, 0.040660644))
            Line((1.577001647, 0.040660644), (1.645898034, 0))
        make_face()
    extrude(amount=3)
    with BuildSketch(Plane(origin=(23.7, 5.2, -50.080898034), x_dir=(0, 0, 1), z_dir=(0, 1, 0))) as fillet_2_piece_2:
        with BuildLine():
            CenterArc((5.086869542, 4), FILLET_2_R, 186.756327031, 83.243672969)
            Line((1.114647656, 3.529411765), (1.035203218, 3.52))
            ThreePointArc((1.035203218, 3.52), (0.860700296, 1.668894486), (-0.059628479, 0.053333333))
            Line((-0.059628479, 0.053333333), (0, -0.08))
            Line((0, -0.08), (5.086869542, -0.08))
            Line((5.086869542, -0.08), (5.086869542, 0))
        make_face()
    extrude(amount=3)
    with BuildSketch(Plane(origin=(23.7, 5.2, -26.789101966), x_dir=(0, 0, -1), z_dir=(0, 1, 0))) as fillet_2_piece_3:
        with BuildLine():
            CenterArc((5.086869542, -4), FILLET_2_R, 90, 83.243672969)
            Line((1.114647656, -3.529411765), (1.035203218, -3.52))
            ThreePointArc((1.035203218, -3.52), (0.860700296, -1.668894486), (-0.059628479, -0.053333333))
            Line((-0.059628479, -0.053333333), (0, 0.08))
            Line((0, 0.08), (5.086869542, 0.08))
            Line((5.086869542, 0.08), (5.086869542, 0))
        make_face()
    extrude(amount=3)
    with BuildSketch(Plane(origin=(23.7, 5.2, -20.080898034), x_dir=(0, 0, 1), z_dir=(0, 1, 0))) as fillet_2_piece_4:
        with BuildLine():
            CenterArc((5.057563246, 1.777752742), FILLET_2_R, 171.732563224, 34.654836408)
            Line((1.099132558, 2.352927922), (1.019963944, 2.364431426))
            ThreePointArc((1.019963944, 2.364431426), (0.65051009, 1.129309678), (-0.059628479, 0.053333333))
            Line((-0.059628479, 0.053333333), (0, -0.08))
            ThreePointArc((0, -0.08), (0.737162579, -0.08), (1.402660397, -0.035555055))
            Line((1.402660397, -0.035555055), (1.474325158, 0))
        make_face()
    extrude(amount=3)

    # 草图42 → 凸台-拉伸21 (add)
    with BuildSketch(Plane(origin=(0, 10, 0), x_dir=(1, 0, 0), z_dir=(0, 1, 0))):
        with Locations((33.2, 41.435)):
            Rectangle(SKETCH_42_W, SKETCH_42_H)
    extrude(amount=EXTRUDE_21_DEPTH)

    # 倒角4
    chamfer_4_edges = [part.edges().sort_by_distance(p)[0] for p in [
        (33.2, 13, -18.435),
        (33.2, 13, -64.435),
    ]]
    chamfer(chamfer_4_edges, length=CHAMFER_4_SIZE - 0.0001)  # a hair under: the kernel refuses the full size

    # 草图43 → 凸台-拉伸22 (add)
    with BuildSketch(Plane(origin=(0, 10, 0), x_dir=(1, 0, 0), z_dir=(0, 1, 0))):
        with Locations((40.8, 90.6525)):
            Rectangle(SKETCH_43_W, SKETCH_43_H)
    extrude(amount=EXTRUDE_22_DEPTH)

    # 草图44 → 凸台-拉伸23 (add)
    with BuildSketch(Plane(origin=(0, 10, 0), x_dir=(1, 0, 0), z_dir=(0, 1, 0))):
        with Locations((22.45, 63.435)):
            Rectangle(SKETCH_44_W, SKETCH_44_H)
    extrude(amount=EXTRUDE_23_DEPTH)


solid = part.part
